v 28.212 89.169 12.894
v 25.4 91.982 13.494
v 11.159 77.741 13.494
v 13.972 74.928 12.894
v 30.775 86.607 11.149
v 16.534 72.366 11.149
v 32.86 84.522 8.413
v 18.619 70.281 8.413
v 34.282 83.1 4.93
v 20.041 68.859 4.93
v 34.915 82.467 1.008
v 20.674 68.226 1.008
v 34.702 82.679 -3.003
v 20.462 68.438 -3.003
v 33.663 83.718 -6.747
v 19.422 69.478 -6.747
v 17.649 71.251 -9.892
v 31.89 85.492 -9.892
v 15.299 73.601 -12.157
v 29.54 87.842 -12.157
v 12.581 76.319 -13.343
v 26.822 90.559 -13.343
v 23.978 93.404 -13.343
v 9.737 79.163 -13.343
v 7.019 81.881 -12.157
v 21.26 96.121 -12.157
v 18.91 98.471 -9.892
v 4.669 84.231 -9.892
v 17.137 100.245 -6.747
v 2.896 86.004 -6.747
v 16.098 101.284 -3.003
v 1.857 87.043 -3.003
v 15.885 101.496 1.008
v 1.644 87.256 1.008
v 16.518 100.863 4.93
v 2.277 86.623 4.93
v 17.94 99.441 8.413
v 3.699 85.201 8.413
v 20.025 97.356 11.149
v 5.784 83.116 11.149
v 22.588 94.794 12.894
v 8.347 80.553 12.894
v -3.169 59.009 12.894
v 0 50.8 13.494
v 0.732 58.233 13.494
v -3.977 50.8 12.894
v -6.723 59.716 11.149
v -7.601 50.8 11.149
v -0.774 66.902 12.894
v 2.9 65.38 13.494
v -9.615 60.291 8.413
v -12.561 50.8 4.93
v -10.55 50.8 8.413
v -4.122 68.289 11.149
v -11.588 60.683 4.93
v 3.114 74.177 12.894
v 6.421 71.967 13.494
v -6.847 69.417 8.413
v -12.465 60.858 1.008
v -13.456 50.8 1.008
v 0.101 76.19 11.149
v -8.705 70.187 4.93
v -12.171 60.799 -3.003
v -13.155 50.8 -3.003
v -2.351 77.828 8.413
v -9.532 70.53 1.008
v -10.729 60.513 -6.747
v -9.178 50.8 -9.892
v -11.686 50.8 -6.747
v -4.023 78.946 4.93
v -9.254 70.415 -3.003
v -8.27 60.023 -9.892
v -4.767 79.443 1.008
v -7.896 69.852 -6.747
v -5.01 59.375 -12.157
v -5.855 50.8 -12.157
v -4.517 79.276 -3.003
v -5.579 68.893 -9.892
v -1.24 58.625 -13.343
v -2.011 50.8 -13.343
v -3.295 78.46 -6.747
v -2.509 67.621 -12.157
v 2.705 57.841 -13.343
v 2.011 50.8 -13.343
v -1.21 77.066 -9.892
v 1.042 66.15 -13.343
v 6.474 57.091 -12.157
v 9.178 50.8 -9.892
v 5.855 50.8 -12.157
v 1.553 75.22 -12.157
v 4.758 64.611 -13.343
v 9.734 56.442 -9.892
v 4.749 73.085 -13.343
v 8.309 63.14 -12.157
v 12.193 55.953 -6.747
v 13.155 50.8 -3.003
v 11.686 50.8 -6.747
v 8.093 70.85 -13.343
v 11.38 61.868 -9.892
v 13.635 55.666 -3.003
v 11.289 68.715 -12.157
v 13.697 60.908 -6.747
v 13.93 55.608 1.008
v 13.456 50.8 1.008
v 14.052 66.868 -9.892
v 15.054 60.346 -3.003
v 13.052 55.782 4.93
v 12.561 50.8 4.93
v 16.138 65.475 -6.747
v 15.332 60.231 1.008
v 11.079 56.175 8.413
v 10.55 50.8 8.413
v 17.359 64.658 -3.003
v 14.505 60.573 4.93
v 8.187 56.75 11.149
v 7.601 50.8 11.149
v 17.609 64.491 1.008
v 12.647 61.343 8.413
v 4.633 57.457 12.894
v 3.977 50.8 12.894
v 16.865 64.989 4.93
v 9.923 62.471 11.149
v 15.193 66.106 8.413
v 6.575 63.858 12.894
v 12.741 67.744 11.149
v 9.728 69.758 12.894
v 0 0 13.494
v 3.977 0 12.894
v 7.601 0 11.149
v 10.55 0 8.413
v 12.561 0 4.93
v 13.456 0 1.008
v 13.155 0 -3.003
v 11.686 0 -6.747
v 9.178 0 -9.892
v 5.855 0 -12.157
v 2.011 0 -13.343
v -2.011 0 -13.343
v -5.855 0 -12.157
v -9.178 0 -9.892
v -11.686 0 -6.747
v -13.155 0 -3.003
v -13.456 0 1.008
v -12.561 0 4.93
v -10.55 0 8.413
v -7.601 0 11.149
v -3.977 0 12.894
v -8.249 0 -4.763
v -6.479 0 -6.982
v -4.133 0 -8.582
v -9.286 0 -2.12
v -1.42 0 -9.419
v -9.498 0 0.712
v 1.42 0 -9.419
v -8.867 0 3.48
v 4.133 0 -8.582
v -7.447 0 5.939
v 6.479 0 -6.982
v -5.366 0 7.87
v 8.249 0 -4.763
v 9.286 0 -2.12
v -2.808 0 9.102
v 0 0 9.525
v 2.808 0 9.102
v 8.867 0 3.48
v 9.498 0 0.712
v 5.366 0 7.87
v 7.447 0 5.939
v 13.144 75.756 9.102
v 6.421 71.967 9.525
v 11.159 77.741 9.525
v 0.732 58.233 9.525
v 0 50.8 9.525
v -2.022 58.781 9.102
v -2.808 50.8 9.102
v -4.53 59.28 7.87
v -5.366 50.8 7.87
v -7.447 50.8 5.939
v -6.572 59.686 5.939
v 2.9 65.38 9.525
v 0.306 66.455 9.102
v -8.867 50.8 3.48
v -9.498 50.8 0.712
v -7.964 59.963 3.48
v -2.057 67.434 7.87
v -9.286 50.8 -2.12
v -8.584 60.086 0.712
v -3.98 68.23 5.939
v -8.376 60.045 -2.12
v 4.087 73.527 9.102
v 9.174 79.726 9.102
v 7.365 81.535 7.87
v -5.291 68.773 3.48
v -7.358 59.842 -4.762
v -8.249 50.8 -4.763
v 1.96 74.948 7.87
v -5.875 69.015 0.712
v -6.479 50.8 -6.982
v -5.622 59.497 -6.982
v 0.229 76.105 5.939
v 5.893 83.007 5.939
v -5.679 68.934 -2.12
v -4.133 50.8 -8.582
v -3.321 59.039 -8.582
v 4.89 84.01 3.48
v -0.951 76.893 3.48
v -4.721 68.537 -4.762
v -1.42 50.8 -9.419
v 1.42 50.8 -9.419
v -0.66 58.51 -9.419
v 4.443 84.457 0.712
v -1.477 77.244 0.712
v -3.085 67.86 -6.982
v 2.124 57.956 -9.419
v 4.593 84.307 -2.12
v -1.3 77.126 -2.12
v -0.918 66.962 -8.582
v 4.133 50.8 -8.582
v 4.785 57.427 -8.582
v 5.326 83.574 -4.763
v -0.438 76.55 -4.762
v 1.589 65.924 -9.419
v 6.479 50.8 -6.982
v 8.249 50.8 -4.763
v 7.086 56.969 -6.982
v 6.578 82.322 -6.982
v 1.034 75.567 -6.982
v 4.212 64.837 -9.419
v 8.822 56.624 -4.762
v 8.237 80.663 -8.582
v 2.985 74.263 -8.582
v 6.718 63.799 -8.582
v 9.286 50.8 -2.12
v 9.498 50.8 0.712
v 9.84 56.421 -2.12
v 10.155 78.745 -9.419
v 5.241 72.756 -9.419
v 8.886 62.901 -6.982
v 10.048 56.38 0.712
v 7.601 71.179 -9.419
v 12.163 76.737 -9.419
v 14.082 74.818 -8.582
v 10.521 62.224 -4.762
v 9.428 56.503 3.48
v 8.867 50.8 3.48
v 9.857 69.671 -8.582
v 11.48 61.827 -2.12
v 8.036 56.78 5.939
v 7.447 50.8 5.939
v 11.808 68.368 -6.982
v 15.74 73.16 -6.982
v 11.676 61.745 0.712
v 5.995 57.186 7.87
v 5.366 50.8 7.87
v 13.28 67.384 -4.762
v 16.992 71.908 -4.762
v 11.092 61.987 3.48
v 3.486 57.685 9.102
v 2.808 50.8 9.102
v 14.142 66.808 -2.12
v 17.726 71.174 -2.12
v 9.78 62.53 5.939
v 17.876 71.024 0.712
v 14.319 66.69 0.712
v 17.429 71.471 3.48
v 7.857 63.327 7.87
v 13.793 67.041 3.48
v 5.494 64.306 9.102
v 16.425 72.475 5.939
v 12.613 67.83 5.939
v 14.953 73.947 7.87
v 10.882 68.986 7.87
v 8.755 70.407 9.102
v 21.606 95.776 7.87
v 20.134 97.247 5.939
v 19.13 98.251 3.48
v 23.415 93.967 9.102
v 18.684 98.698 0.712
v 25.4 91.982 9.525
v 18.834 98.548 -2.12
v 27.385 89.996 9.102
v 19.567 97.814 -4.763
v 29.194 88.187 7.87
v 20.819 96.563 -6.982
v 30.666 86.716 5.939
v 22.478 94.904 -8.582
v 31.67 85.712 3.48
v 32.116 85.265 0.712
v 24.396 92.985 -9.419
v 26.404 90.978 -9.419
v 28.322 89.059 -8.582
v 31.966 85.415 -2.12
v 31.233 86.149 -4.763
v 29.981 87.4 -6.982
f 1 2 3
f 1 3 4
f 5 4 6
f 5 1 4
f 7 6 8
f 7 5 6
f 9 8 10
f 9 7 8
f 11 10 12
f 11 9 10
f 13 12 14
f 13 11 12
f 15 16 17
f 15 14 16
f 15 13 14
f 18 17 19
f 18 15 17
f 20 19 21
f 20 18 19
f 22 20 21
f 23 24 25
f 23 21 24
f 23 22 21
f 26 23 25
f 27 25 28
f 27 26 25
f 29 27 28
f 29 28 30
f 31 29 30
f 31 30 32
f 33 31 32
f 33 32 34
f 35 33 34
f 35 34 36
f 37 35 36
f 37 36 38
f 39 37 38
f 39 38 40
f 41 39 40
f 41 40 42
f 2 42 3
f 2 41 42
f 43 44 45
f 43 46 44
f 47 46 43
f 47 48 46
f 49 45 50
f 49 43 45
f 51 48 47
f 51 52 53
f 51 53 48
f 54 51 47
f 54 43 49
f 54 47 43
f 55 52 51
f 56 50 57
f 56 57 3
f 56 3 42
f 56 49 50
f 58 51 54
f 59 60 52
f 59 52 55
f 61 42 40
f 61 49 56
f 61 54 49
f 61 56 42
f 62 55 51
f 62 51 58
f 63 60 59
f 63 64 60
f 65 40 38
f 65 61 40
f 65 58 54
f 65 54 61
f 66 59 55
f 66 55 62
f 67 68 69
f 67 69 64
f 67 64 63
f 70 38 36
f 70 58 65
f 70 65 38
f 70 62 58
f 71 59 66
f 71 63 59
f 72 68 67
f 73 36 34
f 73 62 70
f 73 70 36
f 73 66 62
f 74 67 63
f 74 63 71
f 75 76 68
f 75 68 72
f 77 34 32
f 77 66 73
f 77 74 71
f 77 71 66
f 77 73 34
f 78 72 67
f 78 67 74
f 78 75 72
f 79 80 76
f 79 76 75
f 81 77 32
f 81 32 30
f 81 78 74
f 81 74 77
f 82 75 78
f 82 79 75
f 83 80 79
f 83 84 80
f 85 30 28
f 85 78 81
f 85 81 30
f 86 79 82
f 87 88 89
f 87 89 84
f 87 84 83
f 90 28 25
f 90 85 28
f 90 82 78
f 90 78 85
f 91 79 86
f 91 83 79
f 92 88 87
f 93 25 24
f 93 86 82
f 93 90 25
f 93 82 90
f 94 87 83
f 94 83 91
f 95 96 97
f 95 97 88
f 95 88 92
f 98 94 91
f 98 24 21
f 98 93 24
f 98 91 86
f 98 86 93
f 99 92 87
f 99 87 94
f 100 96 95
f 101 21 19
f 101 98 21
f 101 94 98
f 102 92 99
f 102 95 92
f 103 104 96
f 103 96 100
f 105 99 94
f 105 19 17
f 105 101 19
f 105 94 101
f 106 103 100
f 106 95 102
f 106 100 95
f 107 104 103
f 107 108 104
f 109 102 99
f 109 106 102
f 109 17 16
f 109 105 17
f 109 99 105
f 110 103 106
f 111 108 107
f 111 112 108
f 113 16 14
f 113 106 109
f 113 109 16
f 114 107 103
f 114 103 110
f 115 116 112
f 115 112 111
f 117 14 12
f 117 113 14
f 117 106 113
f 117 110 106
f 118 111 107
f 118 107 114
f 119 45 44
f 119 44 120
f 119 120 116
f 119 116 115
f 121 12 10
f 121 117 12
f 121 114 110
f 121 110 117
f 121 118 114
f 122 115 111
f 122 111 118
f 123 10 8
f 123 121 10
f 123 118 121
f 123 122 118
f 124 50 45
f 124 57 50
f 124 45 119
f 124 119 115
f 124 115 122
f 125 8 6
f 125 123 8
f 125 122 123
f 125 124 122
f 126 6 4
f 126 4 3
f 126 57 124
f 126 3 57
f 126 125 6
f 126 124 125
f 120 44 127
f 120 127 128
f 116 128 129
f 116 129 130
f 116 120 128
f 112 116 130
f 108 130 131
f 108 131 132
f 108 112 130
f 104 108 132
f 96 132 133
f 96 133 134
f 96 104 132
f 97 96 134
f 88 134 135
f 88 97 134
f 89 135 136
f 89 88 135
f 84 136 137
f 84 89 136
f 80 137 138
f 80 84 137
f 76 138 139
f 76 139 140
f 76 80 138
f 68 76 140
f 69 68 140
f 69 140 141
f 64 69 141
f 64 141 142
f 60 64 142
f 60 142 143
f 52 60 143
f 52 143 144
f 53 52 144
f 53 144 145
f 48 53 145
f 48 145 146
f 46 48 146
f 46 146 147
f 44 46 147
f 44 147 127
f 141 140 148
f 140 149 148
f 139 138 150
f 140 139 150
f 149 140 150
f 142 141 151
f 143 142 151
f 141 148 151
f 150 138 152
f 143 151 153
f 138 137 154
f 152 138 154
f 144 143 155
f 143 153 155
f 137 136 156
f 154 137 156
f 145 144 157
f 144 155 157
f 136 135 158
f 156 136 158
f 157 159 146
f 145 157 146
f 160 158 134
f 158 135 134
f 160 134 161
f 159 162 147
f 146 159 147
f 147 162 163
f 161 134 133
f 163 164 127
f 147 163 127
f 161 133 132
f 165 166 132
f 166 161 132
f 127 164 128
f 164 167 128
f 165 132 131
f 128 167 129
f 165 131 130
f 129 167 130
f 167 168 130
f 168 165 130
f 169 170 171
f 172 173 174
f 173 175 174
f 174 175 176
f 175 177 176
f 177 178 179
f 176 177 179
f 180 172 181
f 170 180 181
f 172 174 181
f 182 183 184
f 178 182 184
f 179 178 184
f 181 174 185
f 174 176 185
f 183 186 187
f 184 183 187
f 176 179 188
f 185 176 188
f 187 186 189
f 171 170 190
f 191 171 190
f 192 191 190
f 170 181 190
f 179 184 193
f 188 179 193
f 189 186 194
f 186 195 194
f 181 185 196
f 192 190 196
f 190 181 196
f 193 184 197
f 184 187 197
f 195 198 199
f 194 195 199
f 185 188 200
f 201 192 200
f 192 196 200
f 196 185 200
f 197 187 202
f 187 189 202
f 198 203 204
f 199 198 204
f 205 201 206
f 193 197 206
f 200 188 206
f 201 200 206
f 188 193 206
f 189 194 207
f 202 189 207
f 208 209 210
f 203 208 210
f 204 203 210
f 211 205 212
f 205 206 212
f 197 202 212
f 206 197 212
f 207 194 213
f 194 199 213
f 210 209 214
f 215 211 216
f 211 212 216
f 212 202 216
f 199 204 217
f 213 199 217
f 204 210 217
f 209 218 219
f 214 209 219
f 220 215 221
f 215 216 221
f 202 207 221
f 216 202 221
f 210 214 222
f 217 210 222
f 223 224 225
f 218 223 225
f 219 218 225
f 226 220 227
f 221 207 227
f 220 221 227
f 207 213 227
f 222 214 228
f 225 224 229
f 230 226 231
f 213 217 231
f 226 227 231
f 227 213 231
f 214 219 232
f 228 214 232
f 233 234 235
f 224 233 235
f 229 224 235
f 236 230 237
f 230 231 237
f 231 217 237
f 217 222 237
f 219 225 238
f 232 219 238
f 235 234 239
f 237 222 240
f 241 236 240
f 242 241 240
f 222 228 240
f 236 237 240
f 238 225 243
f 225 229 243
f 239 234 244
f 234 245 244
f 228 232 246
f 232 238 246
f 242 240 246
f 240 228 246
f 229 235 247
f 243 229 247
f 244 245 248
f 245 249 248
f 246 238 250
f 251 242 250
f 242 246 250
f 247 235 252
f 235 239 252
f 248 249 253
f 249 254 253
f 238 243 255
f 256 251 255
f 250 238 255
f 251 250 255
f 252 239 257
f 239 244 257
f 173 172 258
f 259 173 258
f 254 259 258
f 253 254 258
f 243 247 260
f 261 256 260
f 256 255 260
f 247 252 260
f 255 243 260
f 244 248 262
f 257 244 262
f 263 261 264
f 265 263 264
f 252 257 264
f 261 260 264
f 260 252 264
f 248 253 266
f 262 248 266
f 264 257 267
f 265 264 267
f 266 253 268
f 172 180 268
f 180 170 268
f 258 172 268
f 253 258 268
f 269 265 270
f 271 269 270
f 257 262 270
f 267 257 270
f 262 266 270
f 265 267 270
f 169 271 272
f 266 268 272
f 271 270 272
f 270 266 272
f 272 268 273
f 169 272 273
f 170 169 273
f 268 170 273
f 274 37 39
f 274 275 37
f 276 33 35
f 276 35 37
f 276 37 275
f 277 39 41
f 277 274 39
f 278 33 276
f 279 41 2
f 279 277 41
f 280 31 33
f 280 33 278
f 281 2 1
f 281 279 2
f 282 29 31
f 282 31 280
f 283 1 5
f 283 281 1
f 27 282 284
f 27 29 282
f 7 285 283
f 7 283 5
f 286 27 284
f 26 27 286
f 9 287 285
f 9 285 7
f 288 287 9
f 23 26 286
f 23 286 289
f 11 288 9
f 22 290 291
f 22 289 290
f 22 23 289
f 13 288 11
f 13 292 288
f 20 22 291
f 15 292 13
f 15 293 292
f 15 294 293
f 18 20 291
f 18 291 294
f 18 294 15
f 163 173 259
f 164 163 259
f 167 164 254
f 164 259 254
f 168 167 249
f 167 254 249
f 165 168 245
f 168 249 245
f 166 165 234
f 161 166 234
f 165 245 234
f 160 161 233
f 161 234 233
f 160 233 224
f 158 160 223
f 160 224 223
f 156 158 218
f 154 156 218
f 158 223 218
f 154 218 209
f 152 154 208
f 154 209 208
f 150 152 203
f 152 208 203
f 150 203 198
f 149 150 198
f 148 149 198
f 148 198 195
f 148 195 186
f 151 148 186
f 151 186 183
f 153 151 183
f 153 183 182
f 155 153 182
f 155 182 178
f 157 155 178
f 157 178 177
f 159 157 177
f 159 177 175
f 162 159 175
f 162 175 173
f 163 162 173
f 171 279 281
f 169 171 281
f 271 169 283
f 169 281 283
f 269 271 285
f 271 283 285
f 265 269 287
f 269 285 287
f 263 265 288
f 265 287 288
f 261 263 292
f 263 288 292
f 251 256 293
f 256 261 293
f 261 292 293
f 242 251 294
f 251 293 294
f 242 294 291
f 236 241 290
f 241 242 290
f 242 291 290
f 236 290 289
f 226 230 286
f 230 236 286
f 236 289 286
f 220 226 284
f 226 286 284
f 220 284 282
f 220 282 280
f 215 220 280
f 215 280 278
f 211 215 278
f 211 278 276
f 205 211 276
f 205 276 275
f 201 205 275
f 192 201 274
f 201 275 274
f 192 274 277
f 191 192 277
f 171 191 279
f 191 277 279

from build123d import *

# Parameters (mm, degrees)
SWEEP1_PROFILE_R     = 13.49375
CUT_SWEEP1_PROFILE_R = 9.525


with BuildPart() as part:
    # Sweep1: sweep along a curve in space
    with BuildLine() as sweep1_path:
        Line((0, 0, 0), (0, 50.8, 0))
        ThreePointArc((0, 50.8, 0), (2.900189811, 65.380238773, 0), (11.159231637, 77.740768363, 0))
        Line((11.159231637, 77.740768363, 0), (25.4, 91.981536726, 0))
    # Sweep1 profile (on start of the path) → Sweep1 (sweep)
    with BuildSketch(Plane.ZX):
        Circle(SWEEP1_PROFILE_R)
    sweep(path=sweep1_path.line)

    # Cut-Sweep1: sweep along a curve in space
    with BuildLine() as cut_sweep1_path:
        Line((0, 0, 0), (0, 50.8, 0))
        ThreePointArc((0, 50.8, 0), (2.900189811, 65.380238773, 0), (11.159231637, 77.740768363, 0))
        Line((11.159231637, 77.740768363, 0), (25.4, 91.981536726, 0))
    # Cut-Sweep1 profile (on start of the path) → Cut-Sweep1 (sweep, cut)
    with BuildSketch(Plane.ZX):
        Circle(CUT_SWEEP1_PROFILE_R)
    sweep(path=cut_sweep1_path.line, mode=Mode.SUBTRACT)


solid = part.part
